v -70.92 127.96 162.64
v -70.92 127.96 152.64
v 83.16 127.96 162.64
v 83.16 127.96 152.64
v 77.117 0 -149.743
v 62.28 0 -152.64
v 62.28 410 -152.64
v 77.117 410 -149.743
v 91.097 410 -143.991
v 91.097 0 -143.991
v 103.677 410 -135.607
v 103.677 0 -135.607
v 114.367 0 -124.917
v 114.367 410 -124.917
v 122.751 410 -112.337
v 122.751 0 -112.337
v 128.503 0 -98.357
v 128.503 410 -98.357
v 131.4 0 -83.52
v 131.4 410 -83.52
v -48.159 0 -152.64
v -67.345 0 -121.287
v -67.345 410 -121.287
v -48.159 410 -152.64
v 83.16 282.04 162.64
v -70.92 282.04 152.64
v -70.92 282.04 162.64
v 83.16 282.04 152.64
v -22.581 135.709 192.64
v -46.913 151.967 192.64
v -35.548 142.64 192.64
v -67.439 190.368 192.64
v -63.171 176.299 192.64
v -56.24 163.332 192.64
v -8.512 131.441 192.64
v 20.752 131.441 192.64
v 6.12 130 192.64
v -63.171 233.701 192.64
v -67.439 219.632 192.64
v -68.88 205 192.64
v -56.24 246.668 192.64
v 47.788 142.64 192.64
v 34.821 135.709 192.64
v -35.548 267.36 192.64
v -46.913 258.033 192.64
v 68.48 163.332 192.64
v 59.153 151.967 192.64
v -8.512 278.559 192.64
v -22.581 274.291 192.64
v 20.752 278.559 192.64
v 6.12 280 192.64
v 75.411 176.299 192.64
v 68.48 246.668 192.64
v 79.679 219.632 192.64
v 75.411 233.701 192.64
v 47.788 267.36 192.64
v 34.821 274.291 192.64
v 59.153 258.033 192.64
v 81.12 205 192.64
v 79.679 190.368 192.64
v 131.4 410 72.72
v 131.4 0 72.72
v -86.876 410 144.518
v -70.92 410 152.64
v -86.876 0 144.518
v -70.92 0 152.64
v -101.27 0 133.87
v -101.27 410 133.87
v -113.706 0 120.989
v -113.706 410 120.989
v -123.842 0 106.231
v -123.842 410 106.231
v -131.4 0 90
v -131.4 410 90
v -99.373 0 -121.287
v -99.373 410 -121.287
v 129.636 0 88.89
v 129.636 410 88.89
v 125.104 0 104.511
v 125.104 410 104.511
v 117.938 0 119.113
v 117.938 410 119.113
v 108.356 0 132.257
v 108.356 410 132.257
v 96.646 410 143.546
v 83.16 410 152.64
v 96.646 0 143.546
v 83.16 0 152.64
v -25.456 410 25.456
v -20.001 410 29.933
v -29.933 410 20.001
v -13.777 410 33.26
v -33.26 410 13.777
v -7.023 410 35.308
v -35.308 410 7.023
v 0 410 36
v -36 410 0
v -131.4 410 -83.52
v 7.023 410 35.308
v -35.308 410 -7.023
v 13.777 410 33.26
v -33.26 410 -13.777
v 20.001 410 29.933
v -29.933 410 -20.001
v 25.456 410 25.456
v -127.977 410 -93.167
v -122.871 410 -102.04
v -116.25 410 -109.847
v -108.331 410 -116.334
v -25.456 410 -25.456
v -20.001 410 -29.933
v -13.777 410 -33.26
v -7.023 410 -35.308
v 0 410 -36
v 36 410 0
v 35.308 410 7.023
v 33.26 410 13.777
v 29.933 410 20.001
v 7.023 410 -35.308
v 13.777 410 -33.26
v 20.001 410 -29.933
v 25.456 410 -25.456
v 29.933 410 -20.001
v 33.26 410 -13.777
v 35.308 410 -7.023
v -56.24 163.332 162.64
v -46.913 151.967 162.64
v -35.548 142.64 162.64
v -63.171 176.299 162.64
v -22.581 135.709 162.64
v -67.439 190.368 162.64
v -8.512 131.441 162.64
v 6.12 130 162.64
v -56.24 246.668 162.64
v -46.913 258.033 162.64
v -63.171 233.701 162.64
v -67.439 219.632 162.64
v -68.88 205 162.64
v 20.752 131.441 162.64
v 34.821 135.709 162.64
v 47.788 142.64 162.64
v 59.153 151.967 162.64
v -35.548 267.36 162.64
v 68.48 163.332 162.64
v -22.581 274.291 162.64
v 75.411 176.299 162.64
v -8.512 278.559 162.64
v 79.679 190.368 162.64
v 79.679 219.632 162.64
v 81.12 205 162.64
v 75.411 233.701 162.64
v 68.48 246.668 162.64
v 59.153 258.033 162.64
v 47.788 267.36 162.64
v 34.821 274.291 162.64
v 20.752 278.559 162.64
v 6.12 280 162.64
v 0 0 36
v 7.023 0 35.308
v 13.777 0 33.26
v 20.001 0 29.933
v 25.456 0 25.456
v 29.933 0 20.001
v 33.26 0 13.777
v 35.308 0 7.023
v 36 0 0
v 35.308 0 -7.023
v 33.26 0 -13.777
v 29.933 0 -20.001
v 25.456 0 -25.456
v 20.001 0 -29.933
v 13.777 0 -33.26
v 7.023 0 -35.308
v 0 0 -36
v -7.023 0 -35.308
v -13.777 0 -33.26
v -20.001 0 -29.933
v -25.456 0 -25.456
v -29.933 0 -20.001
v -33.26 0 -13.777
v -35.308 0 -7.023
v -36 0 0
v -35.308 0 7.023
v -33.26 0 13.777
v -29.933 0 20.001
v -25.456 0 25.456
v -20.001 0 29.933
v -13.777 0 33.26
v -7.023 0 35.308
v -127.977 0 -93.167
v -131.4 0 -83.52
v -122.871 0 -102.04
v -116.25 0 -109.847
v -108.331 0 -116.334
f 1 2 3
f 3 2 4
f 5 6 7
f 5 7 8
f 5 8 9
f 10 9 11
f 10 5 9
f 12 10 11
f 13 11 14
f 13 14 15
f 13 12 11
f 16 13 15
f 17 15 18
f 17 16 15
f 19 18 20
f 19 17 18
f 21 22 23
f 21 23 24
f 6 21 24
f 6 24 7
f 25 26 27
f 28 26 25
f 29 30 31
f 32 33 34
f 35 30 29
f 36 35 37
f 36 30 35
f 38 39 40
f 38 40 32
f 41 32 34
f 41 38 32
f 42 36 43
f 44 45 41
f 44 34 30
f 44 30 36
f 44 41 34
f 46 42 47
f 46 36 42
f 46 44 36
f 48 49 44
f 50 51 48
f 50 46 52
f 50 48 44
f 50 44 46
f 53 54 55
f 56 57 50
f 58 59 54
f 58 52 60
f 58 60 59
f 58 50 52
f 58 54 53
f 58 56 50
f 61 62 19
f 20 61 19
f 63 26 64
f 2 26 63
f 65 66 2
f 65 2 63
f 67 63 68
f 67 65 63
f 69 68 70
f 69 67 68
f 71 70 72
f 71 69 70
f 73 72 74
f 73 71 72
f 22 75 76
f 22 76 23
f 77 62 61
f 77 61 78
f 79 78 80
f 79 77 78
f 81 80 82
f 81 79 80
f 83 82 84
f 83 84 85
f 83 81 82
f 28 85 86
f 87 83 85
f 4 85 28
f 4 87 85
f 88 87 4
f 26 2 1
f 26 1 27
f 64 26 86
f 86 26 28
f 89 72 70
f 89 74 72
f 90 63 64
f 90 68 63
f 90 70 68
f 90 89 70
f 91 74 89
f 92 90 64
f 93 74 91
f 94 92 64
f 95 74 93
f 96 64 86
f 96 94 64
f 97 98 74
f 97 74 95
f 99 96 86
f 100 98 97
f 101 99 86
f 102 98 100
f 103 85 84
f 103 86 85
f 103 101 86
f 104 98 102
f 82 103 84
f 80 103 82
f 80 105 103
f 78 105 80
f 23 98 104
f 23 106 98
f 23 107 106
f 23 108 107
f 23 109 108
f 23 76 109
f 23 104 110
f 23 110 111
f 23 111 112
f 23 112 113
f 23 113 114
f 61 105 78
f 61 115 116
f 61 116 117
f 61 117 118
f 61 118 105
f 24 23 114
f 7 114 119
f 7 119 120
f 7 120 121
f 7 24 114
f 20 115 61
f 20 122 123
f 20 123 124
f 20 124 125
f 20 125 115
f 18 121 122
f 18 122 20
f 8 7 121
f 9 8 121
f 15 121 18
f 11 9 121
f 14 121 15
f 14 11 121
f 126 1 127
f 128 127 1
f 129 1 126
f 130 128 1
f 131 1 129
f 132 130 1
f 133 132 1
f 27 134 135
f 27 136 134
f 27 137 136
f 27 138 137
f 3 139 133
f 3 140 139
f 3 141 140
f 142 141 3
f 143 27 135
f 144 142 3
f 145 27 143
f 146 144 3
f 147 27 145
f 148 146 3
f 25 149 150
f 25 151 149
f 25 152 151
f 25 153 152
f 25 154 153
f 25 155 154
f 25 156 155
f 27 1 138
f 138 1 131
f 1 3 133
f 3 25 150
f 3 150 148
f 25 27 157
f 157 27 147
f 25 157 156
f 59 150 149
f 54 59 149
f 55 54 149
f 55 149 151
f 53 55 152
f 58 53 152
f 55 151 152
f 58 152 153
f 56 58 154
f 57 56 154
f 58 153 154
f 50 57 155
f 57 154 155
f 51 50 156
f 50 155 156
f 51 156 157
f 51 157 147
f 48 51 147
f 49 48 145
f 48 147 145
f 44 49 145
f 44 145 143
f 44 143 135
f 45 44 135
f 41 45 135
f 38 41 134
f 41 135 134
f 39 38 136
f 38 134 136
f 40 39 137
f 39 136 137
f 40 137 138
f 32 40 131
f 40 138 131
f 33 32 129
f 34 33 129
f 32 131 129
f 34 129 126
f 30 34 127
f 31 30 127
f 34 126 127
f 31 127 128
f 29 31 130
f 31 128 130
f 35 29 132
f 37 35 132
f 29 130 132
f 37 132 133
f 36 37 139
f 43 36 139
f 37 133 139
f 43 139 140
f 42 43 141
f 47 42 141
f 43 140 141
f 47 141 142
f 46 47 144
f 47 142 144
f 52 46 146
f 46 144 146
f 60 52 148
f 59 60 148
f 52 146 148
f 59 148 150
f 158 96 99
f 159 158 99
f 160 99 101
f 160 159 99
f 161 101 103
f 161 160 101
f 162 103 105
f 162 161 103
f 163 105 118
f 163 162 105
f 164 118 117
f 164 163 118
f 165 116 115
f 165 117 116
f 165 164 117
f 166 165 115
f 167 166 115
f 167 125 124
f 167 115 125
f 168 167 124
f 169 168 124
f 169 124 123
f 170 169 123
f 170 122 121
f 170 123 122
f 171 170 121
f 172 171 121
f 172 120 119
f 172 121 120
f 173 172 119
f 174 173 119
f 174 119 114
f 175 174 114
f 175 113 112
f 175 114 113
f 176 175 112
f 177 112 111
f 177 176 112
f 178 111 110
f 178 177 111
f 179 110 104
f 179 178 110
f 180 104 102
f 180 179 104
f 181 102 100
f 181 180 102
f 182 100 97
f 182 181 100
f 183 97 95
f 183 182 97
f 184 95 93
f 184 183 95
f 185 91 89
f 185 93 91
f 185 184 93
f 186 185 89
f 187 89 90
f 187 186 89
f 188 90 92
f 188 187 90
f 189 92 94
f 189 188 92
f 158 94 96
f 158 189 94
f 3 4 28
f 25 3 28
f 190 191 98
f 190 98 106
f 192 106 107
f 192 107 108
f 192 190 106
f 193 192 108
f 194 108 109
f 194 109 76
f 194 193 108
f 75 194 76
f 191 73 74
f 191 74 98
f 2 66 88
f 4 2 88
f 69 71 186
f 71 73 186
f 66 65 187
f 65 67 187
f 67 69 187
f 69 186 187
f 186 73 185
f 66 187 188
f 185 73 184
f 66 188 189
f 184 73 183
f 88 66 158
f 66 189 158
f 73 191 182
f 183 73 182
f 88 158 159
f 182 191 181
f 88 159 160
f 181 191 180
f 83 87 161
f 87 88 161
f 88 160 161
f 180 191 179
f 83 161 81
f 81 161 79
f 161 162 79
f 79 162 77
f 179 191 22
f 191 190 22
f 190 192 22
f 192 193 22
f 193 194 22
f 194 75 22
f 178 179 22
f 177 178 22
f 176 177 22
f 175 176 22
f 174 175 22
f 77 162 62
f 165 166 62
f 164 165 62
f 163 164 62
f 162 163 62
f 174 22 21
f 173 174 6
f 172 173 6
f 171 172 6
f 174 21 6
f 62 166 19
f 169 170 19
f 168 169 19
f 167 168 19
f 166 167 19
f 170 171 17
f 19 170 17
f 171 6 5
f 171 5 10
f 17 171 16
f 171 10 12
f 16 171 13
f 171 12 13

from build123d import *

# Parameters (mm, degrees)
SKETCH3_W               = 262.8
SKETCH3_H               = 305.28
BOSS_EXTRUDE3_DEPTH     = 410
CUT_EXTRUDE1_DEPTH      = 457.798565672
CUT_EXTRUDE1_DEPTH_BACK = 457.798565672
CUT_EXTRUDE2_DEPTH      = 457.798565672
CUT_EXTRUDE2_DEPTH_BACK = 457.798565672
SKETCH5_R               = 36
SKETCH6_W               = 154.08
SKETCH6_H               = 154.08
BOSS_EXTRUDE4_DEPTH     = 10
SKETCH7_R               = 75
BOSS_EXTRUDE5_DEPTH     = 30


with BuildPart() as part:
    # Sketch3 → Boss-Extrude3 (new body)
    with BuildSketch(Plane(origin=(0, 0, 0), x_dir=(1, 0, 0), z_dir=(0, 1, 0))):
        Rectangle(SKETCH3_W, SKETCH3_H)
    extrude(amount=BOSS_EXTRUDE3_DEPTH)

    # Sketch4 → Cut-Extrude1 (cut, two sides: drawn at the far end of the back side and taken through both)
    with BuildSketch(Plane(origin=(0, 410, 0), x_dir=(1, 0, 0), z_dir=(0, 1, 0)).offset(-CUT_EXTRUDE1_DEPTH_BACK)):
        with BuildLine():
            Line((-131.4, -90), (-131.4, -152.64))
            Line((-131.4, -152.64), (-70.92, -152.64))
            ThreePointArc((-70.92, -152.64), (-107.755247271, -127.687824951), (-131.4, -90))
        make_face()
        with BuildLine():
            Line((83.16, -152.64), (131.4, -152.64))
            Line((131.4, -152.64), (131.4, -72.72))
            ThreePointArc((131.4, -72.72), (117.938305095, -119.113391364), (83.16, -152.64))
        make_face()
        with BuildLine():
            Line((-99.372734155, 121.287125755), (-67.345468311, 121.287125755))
            Line((-67.345468311, 121.287125755), (-48.15934209, 152.64))
            Line((-48.15934209, 152.64), (-131.4, 152.64))
            Line((-131.4, 152.64), (-131.4, 83.52))
            ThreePointArc((-131.4, 83.52), (-119.737831056, 106.093689962), (-99.372734155, 121.287125755))
        make_face()
        with BuildLine():
            Line((131.4, 83.52), (131.4, 152.64))
            Line((131.4, 152.64), (62.28, 152.64))
            ThreePointArc((62.28, 152.64), (109.286007047, 130.526007047), (131.4, 83.52))
        make_face()
    extrude(amount=CUT_EXTRUDE1_DEPTH + CUT_EXTRUDE1_DEPTH_BACK, mode=Mode.SUBTRACT)

    # Sketch5 → Cut-Extrude2 (cut, two sides: drawn at the far end of the back side and taken through both)
    with BuildSketch(Plane(origin=(0, 410, 0), x_dir=(1, 0, 0), z_dir=(0, 1, 0)).offset(-CUT_EXTRUDE2_DEPTH_BACK)):
        with Locations(Location((0, 0, 0), (0, 0, 270))):
            Circle(SKETCH5_R)
    extrude(amount=CUT_EXTRUDE2_DEPTH + CUT_EXTRUDE2_DEPTH_BACK, mode=Mode.SUBTRACT)

    # Sketch6 → Boss-Extrude4 (add)
    with BuildSketch(Plane.XY.offset(152.64)):
        with Locations((6.12, 205)):
            Rectangle(SKETCH6_W, SKETCH6_H)
    extrude(amount=BOSS_EXTRUDE4_DEPTH)

    # Sketch7 → Boss-Extrude5 (add)
    with BuildSketch(Plane.XY.offset(162.64)):
        with Locations((6.12, 205)):
            Circle(SKETCH7_R)
    extrude(amount=BOSS_EXTRUDE5_DEPTH)


solid = part.part
